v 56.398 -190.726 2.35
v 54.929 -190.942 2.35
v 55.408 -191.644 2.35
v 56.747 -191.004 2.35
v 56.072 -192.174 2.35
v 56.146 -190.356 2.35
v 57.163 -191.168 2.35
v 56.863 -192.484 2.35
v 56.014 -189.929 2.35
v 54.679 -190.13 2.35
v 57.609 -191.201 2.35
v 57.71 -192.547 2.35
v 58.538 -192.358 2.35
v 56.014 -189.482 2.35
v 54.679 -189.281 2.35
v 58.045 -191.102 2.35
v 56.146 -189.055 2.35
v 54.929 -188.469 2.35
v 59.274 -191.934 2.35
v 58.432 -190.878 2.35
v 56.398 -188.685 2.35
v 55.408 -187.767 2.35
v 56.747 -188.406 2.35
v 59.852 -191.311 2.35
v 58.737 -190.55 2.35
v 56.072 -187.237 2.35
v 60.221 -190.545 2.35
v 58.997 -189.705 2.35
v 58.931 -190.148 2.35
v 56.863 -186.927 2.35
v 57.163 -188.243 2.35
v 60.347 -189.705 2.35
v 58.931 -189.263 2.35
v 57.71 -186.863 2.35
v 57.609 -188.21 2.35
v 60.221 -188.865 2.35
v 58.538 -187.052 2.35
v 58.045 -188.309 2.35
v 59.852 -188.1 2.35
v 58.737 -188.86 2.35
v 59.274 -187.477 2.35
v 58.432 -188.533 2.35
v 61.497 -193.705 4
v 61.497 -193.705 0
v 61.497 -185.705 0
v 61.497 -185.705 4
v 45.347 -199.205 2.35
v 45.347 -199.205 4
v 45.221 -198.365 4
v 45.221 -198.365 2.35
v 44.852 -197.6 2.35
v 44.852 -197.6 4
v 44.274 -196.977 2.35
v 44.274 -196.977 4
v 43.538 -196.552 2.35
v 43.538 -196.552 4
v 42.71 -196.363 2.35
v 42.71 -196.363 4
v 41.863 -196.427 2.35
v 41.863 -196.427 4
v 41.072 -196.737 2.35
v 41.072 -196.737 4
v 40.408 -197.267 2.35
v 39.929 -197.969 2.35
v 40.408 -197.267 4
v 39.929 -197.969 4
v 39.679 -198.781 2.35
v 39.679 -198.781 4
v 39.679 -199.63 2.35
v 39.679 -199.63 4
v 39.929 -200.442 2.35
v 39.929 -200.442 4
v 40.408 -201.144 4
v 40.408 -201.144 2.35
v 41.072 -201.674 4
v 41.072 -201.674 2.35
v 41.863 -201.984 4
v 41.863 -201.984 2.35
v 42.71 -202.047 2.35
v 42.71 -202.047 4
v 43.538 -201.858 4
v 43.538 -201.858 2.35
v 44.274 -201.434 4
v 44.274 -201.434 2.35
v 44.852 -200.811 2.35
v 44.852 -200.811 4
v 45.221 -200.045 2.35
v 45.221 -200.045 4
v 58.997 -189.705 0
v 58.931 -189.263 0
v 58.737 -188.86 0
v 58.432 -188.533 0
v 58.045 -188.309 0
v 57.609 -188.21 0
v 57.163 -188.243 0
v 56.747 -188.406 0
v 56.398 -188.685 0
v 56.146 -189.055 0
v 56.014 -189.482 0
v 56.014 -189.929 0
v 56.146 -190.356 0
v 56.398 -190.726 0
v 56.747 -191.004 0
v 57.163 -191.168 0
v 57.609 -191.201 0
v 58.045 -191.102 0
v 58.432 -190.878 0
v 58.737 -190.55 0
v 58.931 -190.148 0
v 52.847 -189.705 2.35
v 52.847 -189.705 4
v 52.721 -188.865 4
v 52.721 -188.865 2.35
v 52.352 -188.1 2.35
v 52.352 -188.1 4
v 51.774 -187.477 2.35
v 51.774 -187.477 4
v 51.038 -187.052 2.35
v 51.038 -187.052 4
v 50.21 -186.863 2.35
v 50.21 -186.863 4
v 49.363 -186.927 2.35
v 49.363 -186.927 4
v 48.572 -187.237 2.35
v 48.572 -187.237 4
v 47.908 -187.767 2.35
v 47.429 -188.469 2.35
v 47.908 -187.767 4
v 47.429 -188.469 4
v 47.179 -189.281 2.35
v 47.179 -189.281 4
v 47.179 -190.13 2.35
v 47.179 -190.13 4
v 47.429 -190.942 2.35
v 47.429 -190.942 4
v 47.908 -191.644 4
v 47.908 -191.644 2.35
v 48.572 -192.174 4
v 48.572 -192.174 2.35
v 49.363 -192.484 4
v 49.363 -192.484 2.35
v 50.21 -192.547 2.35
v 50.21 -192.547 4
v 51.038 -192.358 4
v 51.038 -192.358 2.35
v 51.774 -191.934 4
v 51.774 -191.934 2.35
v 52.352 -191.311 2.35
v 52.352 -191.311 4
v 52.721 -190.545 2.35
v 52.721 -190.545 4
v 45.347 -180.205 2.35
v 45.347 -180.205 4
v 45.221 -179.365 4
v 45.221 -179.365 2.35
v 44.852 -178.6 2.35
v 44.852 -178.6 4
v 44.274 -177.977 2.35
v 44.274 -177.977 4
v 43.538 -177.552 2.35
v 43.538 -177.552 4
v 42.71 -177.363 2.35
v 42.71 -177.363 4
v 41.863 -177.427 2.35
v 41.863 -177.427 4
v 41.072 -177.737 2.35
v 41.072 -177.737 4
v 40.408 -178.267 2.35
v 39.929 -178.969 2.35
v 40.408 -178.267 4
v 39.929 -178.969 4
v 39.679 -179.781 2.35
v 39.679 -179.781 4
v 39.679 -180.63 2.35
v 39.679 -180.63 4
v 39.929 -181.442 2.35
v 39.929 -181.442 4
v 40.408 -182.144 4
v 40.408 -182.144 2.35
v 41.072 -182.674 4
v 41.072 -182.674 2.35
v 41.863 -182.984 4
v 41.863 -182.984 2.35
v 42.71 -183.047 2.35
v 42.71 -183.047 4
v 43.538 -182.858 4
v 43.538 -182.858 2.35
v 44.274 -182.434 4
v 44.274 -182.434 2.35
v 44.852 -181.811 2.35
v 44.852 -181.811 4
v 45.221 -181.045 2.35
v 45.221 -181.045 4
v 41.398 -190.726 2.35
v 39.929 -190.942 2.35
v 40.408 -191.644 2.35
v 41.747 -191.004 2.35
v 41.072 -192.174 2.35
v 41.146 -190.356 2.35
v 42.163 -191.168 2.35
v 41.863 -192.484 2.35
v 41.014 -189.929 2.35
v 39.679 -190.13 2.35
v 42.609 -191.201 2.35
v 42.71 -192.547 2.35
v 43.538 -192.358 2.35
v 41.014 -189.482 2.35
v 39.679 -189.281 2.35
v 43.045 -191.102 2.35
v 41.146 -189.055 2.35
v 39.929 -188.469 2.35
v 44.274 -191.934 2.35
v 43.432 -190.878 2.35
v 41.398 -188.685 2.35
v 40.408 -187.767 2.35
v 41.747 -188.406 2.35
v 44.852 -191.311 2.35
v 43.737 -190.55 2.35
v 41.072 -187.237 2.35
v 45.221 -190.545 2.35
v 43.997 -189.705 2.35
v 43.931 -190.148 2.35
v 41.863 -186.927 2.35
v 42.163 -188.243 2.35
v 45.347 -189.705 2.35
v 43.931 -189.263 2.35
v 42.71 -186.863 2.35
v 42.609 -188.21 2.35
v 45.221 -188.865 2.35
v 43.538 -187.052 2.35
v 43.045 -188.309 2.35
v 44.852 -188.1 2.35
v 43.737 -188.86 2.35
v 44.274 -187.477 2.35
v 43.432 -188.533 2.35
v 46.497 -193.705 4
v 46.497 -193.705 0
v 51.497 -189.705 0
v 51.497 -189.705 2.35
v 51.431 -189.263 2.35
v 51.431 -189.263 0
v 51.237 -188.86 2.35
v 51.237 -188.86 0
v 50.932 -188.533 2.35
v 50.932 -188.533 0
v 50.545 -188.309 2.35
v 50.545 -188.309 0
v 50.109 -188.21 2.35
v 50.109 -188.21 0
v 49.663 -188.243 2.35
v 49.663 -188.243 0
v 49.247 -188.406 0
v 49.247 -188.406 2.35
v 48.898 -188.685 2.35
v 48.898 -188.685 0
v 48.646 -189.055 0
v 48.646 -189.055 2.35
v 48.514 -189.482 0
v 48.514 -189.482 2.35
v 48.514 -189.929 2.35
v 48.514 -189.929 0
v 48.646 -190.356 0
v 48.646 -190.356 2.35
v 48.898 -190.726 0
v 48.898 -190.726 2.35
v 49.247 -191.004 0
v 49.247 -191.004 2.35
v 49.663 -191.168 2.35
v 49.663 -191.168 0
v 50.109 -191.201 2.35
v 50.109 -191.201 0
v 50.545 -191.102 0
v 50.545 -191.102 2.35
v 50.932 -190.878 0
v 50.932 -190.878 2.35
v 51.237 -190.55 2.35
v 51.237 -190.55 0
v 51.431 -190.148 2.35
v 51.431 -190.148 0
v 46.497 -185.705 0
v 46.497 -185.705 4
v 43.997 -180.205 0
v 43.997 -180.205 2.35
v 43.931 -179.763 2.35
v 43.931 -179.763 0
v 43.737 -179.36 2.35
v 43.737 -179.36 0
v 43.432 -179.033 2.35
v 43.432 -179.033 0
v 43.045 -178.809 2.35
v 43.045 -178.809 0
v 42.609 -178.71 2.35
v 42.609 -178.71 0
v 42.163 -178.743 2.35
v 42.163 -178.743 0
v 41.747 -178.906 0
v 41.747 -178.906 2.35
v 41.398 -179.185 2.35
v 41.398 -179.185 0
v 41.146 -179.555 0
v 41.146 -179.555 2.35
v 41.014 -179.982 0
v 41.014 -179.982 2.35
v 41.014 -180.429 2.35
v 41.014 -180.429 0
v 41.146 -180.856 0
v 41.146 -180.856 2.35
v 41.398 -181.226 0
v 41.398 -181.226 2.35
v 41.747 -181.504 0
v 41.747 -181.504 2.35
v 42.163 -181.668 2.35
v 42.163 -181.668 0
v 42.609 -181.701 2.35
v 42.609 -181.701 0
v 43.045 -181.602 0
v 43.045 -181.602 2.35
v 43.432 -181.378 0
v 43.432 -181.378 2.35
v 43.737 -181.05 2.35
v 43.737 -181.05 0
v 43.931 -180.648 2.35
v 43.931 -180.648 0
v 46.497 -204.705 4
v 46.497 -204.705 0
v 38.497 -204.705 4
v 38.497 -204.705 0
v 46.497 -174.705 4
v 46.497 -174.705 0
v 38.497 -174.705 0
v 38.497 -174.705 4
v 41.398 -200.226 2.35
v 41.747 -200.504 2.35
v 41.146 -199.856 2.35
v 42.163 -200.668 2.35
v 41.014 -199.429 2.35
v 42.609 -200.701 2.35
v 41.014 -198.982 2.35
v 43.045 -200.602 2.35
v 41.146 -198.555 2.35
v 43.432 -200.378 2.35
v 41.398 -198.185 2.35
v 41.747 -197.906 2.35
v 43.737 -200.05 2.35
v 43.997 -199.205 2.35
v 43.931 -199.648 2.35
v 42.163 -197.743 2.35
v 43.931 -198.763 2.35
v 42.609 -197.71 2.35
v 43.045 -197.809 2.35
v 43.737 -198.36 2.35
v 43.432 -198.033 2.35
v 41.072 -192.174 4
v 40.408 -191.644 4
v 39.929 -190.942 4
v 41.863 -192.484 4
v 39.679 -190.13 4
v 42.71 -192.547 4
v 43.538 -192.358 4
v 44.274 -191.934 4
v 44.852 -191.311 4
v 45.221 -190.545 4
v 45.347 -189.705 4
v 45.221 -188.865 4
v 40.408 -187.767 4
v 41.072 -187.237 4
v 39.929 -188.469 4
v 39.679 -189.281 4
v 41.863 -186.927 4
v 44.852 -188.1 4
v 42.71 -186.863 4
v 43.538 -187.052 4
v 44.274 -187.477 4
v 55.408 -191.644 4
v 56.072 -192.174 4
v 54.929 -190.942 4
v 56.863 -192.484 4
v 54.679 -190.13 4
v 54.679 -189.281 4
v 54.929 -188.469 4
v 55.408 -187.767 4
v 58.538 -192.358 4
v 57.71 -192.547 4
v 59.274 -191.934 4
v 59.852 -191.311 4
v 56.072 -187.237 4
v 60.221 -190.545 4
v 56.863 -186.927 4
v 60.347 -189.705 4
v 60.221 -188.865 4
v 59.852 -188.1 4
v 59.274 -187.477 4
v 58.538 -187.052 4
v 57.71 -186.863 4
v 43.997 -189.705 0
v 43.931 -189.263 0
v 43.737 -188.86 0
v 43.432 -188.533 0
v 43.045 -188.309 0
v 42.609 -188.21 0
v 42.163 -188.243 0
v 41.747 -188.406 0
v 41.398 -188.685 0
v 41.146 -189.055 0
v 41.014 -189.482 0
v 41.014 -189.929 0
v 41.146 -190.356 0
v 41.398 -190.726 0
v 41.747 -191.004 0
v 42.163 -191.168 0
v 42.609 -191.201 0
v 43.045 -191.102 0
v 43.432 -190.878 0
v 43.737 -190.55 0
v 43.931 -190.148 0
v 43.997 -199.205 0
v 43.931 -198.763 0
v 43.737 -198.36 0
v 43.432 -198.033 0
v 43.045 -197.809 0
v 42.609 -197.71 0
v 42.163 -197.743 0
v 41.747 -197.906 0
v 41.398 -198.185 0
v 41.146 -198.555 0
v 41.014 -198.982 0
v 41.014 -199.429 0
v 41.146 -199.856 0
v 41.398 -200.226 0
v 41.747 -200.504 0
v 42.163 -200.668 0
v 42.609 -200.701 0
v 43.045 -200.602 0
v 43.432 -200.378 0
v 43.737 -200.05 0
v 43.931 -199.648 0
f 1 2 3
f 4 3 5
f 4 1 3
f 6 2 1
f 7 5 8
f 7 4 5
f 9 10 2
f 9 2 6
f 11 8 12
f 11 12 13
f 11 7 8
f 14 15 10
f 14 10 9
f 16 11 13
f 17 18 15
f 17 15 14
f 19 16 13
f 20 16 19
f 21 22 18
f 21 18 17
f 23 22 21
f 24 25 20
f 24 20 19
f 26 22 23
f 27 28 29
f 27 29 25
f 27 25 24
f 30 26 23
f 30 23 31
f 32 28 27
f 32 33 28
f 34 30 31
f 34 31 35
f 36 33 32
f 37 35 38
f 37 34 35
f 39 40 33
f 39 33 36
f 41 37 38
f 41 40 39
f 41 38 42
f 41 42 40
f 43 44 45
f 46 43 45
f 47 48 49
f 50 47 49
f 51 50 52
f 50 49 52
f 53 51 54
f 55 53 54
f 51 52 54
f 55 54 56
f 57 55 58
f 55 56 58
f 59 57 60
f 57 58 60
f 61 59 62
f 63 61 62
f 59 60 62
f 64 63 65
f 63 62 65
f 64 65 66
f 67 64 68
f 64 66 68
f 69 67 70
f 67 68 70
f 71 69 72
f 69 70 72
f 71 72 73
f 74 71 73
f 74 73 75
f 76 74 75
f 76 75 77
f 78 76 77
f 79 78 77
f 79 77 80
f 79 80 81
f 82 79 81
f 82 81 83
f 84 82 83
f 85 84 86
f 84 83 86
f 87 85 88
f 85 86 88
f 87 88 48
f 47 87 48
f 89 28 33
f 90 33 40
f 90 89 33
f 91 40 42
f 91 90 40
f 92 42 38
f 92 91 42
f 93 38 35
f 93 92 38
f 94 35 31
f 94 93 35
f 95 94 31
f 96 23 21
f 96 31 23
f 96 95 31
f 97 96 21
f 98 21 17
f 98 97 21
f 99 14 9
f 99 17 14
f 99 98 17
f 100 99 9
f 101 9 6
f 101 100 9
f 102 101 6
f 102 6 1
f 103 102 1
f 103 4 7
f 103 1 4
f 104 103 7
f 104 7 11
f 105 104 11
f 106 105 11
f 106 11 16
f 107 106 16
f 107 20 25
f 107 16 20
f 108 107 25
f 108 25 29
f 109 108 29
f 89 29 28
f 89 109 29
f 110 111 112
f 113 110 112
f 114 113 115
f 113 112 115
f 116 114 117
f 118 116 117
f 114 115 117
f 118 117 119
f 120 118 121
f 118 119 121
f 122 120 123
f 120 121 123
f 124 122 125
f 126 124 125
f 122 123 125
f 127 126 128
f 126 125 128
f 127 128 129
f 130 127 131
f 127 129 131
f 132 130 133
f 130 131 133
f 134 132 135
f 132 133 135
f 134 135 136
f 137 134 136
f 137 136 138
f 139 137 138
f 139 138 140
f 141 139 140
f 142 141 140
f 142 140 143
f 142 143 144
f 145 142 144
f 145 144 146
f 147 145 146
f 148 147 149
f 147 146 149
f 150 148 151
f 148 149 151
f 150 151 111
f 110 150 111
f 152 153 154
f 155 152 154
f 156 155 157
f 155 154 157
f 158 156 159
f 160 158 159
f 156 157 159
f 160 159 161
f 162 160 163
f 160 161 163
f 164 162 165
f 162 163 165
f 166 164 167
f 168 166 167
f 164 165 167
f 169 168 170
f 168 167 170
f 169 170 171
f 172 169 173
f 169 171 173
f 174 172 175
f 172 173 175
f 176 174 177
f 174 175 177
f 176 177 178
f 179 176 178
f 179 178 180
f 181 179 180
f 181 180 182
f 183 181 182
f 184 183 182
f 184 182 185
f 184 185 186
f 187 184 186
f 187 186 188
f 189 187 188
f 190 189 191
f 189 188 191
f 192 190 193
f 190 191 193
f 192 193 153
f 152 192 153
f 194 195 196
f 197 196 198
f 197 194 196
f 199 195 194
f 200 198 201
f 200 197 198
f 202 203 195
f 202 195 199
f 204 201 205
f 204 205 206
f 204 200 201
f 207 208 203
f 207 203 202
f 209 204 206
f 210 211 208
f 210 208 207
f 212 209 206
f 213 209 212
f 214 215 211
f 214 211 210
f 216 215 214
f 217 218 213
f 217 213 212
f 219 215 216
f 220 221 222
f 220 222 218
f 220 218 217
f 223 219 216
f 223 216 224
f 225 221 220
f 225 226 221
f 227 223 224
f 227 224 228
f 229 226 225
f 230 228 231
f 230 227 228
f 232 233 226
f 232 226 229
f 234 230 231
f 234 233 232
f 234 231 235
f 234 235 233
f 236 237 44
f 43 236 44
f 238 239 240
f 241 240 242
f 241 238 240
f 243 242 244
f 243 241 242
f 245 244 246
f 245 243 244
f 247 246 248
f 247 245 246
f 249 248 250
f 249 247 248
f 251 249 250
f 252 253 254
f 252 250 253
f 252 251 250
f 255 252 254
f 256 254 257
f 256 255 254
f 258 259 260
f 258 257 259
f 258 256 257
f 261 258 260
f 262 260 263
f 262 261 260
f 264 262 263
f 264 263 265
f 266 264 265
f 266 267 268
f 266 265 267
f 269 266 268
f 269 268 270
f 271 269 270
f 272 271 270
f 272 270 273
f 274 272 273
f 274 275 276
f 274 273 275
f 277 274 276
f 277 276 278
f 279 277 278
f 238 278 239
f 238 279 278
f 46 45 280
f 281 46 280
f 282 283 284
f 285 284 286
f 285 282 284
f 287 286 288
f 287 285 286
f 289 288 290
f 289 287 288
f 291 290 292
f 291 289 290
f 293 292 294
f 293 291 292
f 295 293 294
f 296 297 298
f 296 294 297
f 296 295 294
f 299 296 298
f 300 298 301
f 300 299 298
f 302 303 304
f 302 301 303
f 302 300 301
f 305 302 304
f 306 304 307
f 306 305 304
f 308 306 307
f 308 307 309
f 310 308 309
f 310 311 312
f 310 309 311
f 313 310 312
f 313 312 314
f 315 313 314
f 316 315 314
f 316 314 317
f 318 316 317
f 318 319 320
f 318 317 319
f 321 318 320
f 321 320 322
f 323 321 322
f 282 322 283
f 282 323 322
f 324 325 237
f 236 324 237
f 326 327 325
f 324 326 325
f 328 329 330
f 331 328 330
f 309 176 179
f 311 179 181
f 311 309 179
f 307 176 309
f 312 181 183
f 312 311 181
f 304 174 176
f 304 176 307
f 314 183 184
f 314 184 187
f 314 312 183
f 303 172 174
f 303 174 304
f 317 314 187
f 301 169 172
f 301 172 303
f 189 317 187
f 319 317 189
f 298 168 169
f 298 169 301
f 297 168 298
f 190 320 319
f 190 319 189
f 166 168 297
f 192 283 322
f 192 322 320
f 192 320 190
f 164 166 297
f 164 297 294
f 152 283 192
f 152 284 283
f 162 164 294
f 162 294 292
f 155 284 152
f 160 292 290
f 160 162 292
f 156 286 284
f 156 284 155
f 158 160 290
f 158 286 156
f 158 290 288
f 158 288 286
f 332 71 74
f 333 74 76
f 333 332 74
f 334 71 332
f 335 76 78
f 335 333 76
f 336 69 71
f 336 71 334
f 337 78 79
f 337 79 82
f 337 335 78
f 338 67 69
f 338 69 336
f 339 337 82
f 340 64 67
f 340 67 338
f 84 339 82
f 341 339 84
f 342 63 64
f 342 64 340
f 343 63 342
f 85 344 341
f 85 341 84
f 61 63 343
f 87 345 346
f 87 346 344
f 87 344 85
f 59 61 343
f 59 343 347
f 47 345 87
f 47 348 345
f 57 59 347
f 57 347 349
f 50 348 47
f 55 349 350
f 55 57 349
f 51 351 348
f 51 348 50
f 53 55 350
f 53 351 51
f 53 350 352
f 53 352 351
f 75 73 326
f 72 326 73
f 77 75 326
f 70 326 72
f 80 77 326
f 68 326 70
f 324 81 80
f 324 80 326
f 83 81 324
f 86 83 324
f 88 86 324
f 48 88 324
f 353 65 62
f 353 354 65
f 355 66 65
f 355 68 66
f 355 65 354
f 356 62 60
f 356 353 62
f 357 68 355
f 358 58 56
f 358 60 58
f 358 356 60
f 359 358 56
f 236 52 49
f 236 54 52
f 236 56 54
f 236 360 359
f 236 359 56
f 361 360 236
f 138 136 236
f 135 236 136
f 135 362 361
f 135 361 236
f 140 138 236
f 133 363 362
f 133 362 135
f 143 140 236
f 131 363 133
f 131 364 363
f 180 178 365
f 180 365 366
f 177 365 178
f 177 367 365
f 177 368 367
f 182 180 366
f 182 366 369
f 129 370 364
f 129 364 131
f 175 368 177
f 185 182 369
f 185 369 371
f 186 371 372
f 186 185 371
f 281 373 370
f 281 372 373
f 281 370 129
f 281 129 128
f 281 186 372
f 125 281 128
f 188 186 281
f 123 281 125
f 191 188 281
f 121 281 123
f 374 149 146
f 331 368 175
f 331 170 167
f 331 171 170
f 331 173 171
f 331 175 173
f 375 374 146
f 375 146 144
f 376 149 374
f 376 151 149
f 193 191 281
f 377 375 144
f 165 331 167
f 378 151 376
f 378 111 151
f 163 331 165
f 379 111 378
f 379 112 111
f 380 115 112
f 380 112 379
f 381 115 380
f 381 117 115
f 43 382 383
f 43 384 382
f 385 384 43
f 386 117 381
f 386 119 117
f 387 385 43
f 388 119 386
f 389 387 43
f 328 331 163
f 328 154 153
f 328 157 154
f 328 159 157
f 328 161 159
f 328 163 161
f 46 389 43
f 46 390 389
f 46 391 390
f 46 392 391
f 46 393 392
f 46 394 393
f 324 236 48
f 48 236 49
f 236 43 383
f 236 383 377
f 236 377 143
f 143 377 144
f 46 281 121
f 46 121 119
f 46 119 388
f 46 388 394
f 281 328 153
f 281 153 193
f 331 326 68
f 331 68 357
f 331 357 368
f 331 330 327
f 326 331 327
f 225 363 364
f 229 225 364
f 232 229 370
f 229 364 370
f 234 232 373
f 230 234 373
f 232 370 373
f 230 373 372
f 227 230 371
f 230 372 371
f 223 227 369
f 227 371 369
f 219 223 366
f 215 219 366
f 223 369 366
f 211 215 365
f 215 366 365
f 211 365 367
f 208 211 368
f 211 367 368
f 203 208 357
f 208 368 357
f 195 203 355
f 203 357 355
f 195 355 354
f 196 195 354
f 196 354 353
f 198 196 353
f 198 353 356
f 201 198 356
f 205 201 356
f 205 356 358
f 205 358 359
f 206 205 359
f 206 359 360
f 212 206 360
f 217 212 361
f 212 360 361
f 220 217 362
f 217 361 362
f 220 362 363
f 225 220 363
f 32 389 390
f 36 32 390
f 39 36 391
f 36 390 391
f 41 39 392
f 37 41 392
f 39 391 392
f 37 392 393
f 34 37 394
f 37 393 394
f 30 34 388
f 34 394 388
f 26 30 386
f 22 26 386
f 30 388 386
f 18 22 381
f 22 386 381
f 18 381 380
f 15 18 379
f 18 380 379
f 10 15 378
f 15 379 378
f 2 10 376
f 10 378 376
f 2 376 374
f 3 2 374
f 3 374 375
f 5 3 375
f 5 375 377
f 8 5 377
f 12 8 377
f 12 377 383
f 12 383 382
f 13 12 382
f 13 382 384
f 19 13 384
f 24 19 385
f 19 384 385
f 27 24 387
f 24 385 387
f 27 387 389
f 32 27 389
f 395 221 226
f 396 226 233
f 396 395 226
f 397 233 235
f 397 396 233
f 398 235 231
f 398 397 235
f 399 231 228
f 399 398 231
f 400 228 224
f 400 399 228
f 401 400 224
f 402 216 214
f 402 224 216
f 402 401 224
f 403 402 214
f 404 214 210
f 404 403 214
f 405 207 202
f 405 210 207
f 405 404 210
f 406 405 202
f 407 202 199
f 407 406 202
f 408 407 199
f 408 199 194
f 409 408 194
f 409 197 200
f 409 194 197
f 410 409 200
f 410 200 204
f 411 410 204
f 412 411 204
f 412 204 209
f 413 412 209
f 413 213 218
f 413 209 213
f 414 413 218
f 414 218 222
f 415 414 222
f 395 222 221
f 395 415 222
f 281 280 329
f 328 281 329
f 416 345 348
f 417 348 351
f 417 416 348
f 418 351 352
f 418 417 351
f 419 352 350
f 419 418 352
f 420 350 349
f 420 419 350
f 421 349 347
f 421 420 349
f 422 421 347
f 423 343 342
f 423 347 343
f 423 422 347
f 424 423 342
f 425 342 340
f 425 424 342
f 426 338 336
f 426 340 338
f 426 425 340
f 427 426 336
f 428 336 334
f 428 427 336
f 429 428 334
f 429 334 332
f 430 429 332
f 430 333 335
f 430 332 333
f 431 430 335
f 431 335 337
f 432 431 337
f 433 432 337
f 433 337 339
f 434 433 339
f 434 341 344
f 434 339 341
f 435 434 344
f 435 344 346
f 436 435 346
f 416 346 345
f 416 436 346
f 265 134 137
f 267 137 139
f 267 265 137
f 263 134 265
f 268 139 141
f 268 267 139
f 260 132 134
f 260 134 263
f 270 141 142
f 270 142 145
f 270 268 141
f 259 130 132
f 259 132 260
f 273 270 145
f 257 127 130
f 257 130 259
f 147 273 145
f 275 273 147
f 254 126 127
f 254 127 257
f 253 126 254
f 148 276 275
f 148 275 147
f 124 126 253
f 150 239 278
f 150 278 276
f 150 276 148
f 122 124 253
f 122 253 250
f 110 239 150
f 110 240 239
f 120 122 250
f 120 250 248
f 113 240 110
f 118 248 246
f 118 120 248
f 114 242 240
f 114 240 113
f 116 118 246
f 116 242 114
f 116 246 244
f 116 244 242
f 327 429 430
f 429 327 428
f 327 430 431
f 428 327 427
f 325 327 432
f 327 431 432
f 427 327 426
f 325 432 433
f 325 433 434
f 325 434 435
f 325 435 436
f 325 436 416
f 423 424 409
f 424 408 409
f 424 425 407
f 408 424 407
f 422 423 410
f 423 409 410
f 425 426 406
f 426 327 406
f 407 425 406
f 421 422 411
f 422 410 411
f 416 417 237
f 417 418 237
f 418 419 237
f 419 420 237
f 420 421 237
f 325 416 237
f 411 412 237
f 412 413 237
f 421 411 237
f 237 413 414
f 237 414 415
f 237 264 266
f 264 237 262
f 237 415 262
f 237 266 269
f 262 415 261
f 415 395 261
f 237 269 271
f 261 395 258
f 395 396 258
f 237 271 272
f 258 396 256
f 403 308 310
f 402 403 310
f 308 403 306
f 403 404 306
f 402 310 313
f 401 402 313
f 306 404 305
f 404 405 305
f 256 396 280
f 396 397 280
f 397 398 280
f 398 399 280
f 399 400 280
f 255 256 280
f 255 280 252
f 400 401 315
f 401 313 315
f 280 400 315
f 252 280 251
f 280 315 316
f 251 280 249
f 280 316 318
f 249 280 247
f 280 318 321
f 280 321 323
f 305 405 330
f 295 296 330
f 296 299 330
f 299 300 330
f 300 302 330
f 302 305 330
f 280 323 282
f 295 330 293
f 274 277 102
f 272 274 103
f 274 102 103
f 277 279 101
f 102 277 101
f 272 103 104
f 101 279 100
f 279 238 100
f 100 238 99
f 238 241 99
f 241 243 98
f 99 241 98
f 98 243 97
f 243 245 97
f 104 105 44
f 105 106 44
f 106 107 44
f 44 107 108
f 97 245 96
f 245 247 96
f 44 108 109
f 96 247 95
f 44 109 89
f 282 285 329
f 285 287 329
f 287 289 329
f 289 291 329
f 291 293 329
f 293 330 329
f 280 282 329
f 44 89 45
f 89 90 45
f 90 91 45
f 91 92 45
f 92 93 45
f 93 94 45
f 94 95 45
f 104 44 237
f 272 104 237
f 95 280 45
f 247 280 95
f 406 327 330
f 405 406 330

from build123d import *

# Parameters (mm, degrees)
CROQUIS2_R              = 1.5
SALIENTE_EXTRUIR1_DEPTH = 4
CROQUIS3_R              = 2.85
CORTAR_EXTRUIR1_DEPTH   = 1.65


with BuildPart() as part:
    # Croquis2 → Saliente-Extruir1 (new body)
    with BuildSketch(Plane.XY):
        Polygon((38.497217209, -204.70543153), (46.497217209, -204.70543153), (46.497217209, -193.70543153), (61.497217209, -193.70543153), (61.497217209, -185.70543153), (46.497217209, -185.70543153), (46.497217209, -174.70543153), (38.497217209, -174.70543153), align=None)
        with Locations((42.497217209, -189.70543153)):
            Circle(CROQUIS2_R, mode=Mode.SUBTRACT)
        with Locations((42.497217209, -199.20543153)):
            Circle(CROQUIS2_R, mode=Mode.SUBTRACT)
        with Locations((57.497217209, -189.70543153)):
            Circle(CROQUIS2_R, mode=Mode.SUBTRACT)
        with Locations((49.997217209, -189.70543153)):
            Circle(CROQUIS2_R, mode=Mode.SUBTRACT)
        with Locations((42.497217209, -180.20543153)):
            Circle(CROQUIS2_R, mode=Mode.SUBTRACT)
    extrude(amount=SALIENTE_EXTRUIR1_DEPTH)

    # Croquis3 → Cortar-Extruir1 (cut)
    with BuildSketch(Plane.XY.offset(4)):
        with Locations((42.497217209, -199.20543153)):
            Circle(CROQUIS3_R)
        with Locations((42.497217209, -189.70543153)):
            Circle(CROQUIS3_R)
        with Locations((42.497217209, -180.20543153)):
            Circle(CROQUIS3_R)
        with Locations((49.997217209, -189.70543153)):
            Circle(CROQUIS3_R)
        with Locations((57.497217209, -189.70543153)):
            Circle(CROQUIS3_R)
    extrude(amount=-CORTAR_EXTRUIR1_DEPTH, mode=Mode.SUBTRACT)


solid = part.part
